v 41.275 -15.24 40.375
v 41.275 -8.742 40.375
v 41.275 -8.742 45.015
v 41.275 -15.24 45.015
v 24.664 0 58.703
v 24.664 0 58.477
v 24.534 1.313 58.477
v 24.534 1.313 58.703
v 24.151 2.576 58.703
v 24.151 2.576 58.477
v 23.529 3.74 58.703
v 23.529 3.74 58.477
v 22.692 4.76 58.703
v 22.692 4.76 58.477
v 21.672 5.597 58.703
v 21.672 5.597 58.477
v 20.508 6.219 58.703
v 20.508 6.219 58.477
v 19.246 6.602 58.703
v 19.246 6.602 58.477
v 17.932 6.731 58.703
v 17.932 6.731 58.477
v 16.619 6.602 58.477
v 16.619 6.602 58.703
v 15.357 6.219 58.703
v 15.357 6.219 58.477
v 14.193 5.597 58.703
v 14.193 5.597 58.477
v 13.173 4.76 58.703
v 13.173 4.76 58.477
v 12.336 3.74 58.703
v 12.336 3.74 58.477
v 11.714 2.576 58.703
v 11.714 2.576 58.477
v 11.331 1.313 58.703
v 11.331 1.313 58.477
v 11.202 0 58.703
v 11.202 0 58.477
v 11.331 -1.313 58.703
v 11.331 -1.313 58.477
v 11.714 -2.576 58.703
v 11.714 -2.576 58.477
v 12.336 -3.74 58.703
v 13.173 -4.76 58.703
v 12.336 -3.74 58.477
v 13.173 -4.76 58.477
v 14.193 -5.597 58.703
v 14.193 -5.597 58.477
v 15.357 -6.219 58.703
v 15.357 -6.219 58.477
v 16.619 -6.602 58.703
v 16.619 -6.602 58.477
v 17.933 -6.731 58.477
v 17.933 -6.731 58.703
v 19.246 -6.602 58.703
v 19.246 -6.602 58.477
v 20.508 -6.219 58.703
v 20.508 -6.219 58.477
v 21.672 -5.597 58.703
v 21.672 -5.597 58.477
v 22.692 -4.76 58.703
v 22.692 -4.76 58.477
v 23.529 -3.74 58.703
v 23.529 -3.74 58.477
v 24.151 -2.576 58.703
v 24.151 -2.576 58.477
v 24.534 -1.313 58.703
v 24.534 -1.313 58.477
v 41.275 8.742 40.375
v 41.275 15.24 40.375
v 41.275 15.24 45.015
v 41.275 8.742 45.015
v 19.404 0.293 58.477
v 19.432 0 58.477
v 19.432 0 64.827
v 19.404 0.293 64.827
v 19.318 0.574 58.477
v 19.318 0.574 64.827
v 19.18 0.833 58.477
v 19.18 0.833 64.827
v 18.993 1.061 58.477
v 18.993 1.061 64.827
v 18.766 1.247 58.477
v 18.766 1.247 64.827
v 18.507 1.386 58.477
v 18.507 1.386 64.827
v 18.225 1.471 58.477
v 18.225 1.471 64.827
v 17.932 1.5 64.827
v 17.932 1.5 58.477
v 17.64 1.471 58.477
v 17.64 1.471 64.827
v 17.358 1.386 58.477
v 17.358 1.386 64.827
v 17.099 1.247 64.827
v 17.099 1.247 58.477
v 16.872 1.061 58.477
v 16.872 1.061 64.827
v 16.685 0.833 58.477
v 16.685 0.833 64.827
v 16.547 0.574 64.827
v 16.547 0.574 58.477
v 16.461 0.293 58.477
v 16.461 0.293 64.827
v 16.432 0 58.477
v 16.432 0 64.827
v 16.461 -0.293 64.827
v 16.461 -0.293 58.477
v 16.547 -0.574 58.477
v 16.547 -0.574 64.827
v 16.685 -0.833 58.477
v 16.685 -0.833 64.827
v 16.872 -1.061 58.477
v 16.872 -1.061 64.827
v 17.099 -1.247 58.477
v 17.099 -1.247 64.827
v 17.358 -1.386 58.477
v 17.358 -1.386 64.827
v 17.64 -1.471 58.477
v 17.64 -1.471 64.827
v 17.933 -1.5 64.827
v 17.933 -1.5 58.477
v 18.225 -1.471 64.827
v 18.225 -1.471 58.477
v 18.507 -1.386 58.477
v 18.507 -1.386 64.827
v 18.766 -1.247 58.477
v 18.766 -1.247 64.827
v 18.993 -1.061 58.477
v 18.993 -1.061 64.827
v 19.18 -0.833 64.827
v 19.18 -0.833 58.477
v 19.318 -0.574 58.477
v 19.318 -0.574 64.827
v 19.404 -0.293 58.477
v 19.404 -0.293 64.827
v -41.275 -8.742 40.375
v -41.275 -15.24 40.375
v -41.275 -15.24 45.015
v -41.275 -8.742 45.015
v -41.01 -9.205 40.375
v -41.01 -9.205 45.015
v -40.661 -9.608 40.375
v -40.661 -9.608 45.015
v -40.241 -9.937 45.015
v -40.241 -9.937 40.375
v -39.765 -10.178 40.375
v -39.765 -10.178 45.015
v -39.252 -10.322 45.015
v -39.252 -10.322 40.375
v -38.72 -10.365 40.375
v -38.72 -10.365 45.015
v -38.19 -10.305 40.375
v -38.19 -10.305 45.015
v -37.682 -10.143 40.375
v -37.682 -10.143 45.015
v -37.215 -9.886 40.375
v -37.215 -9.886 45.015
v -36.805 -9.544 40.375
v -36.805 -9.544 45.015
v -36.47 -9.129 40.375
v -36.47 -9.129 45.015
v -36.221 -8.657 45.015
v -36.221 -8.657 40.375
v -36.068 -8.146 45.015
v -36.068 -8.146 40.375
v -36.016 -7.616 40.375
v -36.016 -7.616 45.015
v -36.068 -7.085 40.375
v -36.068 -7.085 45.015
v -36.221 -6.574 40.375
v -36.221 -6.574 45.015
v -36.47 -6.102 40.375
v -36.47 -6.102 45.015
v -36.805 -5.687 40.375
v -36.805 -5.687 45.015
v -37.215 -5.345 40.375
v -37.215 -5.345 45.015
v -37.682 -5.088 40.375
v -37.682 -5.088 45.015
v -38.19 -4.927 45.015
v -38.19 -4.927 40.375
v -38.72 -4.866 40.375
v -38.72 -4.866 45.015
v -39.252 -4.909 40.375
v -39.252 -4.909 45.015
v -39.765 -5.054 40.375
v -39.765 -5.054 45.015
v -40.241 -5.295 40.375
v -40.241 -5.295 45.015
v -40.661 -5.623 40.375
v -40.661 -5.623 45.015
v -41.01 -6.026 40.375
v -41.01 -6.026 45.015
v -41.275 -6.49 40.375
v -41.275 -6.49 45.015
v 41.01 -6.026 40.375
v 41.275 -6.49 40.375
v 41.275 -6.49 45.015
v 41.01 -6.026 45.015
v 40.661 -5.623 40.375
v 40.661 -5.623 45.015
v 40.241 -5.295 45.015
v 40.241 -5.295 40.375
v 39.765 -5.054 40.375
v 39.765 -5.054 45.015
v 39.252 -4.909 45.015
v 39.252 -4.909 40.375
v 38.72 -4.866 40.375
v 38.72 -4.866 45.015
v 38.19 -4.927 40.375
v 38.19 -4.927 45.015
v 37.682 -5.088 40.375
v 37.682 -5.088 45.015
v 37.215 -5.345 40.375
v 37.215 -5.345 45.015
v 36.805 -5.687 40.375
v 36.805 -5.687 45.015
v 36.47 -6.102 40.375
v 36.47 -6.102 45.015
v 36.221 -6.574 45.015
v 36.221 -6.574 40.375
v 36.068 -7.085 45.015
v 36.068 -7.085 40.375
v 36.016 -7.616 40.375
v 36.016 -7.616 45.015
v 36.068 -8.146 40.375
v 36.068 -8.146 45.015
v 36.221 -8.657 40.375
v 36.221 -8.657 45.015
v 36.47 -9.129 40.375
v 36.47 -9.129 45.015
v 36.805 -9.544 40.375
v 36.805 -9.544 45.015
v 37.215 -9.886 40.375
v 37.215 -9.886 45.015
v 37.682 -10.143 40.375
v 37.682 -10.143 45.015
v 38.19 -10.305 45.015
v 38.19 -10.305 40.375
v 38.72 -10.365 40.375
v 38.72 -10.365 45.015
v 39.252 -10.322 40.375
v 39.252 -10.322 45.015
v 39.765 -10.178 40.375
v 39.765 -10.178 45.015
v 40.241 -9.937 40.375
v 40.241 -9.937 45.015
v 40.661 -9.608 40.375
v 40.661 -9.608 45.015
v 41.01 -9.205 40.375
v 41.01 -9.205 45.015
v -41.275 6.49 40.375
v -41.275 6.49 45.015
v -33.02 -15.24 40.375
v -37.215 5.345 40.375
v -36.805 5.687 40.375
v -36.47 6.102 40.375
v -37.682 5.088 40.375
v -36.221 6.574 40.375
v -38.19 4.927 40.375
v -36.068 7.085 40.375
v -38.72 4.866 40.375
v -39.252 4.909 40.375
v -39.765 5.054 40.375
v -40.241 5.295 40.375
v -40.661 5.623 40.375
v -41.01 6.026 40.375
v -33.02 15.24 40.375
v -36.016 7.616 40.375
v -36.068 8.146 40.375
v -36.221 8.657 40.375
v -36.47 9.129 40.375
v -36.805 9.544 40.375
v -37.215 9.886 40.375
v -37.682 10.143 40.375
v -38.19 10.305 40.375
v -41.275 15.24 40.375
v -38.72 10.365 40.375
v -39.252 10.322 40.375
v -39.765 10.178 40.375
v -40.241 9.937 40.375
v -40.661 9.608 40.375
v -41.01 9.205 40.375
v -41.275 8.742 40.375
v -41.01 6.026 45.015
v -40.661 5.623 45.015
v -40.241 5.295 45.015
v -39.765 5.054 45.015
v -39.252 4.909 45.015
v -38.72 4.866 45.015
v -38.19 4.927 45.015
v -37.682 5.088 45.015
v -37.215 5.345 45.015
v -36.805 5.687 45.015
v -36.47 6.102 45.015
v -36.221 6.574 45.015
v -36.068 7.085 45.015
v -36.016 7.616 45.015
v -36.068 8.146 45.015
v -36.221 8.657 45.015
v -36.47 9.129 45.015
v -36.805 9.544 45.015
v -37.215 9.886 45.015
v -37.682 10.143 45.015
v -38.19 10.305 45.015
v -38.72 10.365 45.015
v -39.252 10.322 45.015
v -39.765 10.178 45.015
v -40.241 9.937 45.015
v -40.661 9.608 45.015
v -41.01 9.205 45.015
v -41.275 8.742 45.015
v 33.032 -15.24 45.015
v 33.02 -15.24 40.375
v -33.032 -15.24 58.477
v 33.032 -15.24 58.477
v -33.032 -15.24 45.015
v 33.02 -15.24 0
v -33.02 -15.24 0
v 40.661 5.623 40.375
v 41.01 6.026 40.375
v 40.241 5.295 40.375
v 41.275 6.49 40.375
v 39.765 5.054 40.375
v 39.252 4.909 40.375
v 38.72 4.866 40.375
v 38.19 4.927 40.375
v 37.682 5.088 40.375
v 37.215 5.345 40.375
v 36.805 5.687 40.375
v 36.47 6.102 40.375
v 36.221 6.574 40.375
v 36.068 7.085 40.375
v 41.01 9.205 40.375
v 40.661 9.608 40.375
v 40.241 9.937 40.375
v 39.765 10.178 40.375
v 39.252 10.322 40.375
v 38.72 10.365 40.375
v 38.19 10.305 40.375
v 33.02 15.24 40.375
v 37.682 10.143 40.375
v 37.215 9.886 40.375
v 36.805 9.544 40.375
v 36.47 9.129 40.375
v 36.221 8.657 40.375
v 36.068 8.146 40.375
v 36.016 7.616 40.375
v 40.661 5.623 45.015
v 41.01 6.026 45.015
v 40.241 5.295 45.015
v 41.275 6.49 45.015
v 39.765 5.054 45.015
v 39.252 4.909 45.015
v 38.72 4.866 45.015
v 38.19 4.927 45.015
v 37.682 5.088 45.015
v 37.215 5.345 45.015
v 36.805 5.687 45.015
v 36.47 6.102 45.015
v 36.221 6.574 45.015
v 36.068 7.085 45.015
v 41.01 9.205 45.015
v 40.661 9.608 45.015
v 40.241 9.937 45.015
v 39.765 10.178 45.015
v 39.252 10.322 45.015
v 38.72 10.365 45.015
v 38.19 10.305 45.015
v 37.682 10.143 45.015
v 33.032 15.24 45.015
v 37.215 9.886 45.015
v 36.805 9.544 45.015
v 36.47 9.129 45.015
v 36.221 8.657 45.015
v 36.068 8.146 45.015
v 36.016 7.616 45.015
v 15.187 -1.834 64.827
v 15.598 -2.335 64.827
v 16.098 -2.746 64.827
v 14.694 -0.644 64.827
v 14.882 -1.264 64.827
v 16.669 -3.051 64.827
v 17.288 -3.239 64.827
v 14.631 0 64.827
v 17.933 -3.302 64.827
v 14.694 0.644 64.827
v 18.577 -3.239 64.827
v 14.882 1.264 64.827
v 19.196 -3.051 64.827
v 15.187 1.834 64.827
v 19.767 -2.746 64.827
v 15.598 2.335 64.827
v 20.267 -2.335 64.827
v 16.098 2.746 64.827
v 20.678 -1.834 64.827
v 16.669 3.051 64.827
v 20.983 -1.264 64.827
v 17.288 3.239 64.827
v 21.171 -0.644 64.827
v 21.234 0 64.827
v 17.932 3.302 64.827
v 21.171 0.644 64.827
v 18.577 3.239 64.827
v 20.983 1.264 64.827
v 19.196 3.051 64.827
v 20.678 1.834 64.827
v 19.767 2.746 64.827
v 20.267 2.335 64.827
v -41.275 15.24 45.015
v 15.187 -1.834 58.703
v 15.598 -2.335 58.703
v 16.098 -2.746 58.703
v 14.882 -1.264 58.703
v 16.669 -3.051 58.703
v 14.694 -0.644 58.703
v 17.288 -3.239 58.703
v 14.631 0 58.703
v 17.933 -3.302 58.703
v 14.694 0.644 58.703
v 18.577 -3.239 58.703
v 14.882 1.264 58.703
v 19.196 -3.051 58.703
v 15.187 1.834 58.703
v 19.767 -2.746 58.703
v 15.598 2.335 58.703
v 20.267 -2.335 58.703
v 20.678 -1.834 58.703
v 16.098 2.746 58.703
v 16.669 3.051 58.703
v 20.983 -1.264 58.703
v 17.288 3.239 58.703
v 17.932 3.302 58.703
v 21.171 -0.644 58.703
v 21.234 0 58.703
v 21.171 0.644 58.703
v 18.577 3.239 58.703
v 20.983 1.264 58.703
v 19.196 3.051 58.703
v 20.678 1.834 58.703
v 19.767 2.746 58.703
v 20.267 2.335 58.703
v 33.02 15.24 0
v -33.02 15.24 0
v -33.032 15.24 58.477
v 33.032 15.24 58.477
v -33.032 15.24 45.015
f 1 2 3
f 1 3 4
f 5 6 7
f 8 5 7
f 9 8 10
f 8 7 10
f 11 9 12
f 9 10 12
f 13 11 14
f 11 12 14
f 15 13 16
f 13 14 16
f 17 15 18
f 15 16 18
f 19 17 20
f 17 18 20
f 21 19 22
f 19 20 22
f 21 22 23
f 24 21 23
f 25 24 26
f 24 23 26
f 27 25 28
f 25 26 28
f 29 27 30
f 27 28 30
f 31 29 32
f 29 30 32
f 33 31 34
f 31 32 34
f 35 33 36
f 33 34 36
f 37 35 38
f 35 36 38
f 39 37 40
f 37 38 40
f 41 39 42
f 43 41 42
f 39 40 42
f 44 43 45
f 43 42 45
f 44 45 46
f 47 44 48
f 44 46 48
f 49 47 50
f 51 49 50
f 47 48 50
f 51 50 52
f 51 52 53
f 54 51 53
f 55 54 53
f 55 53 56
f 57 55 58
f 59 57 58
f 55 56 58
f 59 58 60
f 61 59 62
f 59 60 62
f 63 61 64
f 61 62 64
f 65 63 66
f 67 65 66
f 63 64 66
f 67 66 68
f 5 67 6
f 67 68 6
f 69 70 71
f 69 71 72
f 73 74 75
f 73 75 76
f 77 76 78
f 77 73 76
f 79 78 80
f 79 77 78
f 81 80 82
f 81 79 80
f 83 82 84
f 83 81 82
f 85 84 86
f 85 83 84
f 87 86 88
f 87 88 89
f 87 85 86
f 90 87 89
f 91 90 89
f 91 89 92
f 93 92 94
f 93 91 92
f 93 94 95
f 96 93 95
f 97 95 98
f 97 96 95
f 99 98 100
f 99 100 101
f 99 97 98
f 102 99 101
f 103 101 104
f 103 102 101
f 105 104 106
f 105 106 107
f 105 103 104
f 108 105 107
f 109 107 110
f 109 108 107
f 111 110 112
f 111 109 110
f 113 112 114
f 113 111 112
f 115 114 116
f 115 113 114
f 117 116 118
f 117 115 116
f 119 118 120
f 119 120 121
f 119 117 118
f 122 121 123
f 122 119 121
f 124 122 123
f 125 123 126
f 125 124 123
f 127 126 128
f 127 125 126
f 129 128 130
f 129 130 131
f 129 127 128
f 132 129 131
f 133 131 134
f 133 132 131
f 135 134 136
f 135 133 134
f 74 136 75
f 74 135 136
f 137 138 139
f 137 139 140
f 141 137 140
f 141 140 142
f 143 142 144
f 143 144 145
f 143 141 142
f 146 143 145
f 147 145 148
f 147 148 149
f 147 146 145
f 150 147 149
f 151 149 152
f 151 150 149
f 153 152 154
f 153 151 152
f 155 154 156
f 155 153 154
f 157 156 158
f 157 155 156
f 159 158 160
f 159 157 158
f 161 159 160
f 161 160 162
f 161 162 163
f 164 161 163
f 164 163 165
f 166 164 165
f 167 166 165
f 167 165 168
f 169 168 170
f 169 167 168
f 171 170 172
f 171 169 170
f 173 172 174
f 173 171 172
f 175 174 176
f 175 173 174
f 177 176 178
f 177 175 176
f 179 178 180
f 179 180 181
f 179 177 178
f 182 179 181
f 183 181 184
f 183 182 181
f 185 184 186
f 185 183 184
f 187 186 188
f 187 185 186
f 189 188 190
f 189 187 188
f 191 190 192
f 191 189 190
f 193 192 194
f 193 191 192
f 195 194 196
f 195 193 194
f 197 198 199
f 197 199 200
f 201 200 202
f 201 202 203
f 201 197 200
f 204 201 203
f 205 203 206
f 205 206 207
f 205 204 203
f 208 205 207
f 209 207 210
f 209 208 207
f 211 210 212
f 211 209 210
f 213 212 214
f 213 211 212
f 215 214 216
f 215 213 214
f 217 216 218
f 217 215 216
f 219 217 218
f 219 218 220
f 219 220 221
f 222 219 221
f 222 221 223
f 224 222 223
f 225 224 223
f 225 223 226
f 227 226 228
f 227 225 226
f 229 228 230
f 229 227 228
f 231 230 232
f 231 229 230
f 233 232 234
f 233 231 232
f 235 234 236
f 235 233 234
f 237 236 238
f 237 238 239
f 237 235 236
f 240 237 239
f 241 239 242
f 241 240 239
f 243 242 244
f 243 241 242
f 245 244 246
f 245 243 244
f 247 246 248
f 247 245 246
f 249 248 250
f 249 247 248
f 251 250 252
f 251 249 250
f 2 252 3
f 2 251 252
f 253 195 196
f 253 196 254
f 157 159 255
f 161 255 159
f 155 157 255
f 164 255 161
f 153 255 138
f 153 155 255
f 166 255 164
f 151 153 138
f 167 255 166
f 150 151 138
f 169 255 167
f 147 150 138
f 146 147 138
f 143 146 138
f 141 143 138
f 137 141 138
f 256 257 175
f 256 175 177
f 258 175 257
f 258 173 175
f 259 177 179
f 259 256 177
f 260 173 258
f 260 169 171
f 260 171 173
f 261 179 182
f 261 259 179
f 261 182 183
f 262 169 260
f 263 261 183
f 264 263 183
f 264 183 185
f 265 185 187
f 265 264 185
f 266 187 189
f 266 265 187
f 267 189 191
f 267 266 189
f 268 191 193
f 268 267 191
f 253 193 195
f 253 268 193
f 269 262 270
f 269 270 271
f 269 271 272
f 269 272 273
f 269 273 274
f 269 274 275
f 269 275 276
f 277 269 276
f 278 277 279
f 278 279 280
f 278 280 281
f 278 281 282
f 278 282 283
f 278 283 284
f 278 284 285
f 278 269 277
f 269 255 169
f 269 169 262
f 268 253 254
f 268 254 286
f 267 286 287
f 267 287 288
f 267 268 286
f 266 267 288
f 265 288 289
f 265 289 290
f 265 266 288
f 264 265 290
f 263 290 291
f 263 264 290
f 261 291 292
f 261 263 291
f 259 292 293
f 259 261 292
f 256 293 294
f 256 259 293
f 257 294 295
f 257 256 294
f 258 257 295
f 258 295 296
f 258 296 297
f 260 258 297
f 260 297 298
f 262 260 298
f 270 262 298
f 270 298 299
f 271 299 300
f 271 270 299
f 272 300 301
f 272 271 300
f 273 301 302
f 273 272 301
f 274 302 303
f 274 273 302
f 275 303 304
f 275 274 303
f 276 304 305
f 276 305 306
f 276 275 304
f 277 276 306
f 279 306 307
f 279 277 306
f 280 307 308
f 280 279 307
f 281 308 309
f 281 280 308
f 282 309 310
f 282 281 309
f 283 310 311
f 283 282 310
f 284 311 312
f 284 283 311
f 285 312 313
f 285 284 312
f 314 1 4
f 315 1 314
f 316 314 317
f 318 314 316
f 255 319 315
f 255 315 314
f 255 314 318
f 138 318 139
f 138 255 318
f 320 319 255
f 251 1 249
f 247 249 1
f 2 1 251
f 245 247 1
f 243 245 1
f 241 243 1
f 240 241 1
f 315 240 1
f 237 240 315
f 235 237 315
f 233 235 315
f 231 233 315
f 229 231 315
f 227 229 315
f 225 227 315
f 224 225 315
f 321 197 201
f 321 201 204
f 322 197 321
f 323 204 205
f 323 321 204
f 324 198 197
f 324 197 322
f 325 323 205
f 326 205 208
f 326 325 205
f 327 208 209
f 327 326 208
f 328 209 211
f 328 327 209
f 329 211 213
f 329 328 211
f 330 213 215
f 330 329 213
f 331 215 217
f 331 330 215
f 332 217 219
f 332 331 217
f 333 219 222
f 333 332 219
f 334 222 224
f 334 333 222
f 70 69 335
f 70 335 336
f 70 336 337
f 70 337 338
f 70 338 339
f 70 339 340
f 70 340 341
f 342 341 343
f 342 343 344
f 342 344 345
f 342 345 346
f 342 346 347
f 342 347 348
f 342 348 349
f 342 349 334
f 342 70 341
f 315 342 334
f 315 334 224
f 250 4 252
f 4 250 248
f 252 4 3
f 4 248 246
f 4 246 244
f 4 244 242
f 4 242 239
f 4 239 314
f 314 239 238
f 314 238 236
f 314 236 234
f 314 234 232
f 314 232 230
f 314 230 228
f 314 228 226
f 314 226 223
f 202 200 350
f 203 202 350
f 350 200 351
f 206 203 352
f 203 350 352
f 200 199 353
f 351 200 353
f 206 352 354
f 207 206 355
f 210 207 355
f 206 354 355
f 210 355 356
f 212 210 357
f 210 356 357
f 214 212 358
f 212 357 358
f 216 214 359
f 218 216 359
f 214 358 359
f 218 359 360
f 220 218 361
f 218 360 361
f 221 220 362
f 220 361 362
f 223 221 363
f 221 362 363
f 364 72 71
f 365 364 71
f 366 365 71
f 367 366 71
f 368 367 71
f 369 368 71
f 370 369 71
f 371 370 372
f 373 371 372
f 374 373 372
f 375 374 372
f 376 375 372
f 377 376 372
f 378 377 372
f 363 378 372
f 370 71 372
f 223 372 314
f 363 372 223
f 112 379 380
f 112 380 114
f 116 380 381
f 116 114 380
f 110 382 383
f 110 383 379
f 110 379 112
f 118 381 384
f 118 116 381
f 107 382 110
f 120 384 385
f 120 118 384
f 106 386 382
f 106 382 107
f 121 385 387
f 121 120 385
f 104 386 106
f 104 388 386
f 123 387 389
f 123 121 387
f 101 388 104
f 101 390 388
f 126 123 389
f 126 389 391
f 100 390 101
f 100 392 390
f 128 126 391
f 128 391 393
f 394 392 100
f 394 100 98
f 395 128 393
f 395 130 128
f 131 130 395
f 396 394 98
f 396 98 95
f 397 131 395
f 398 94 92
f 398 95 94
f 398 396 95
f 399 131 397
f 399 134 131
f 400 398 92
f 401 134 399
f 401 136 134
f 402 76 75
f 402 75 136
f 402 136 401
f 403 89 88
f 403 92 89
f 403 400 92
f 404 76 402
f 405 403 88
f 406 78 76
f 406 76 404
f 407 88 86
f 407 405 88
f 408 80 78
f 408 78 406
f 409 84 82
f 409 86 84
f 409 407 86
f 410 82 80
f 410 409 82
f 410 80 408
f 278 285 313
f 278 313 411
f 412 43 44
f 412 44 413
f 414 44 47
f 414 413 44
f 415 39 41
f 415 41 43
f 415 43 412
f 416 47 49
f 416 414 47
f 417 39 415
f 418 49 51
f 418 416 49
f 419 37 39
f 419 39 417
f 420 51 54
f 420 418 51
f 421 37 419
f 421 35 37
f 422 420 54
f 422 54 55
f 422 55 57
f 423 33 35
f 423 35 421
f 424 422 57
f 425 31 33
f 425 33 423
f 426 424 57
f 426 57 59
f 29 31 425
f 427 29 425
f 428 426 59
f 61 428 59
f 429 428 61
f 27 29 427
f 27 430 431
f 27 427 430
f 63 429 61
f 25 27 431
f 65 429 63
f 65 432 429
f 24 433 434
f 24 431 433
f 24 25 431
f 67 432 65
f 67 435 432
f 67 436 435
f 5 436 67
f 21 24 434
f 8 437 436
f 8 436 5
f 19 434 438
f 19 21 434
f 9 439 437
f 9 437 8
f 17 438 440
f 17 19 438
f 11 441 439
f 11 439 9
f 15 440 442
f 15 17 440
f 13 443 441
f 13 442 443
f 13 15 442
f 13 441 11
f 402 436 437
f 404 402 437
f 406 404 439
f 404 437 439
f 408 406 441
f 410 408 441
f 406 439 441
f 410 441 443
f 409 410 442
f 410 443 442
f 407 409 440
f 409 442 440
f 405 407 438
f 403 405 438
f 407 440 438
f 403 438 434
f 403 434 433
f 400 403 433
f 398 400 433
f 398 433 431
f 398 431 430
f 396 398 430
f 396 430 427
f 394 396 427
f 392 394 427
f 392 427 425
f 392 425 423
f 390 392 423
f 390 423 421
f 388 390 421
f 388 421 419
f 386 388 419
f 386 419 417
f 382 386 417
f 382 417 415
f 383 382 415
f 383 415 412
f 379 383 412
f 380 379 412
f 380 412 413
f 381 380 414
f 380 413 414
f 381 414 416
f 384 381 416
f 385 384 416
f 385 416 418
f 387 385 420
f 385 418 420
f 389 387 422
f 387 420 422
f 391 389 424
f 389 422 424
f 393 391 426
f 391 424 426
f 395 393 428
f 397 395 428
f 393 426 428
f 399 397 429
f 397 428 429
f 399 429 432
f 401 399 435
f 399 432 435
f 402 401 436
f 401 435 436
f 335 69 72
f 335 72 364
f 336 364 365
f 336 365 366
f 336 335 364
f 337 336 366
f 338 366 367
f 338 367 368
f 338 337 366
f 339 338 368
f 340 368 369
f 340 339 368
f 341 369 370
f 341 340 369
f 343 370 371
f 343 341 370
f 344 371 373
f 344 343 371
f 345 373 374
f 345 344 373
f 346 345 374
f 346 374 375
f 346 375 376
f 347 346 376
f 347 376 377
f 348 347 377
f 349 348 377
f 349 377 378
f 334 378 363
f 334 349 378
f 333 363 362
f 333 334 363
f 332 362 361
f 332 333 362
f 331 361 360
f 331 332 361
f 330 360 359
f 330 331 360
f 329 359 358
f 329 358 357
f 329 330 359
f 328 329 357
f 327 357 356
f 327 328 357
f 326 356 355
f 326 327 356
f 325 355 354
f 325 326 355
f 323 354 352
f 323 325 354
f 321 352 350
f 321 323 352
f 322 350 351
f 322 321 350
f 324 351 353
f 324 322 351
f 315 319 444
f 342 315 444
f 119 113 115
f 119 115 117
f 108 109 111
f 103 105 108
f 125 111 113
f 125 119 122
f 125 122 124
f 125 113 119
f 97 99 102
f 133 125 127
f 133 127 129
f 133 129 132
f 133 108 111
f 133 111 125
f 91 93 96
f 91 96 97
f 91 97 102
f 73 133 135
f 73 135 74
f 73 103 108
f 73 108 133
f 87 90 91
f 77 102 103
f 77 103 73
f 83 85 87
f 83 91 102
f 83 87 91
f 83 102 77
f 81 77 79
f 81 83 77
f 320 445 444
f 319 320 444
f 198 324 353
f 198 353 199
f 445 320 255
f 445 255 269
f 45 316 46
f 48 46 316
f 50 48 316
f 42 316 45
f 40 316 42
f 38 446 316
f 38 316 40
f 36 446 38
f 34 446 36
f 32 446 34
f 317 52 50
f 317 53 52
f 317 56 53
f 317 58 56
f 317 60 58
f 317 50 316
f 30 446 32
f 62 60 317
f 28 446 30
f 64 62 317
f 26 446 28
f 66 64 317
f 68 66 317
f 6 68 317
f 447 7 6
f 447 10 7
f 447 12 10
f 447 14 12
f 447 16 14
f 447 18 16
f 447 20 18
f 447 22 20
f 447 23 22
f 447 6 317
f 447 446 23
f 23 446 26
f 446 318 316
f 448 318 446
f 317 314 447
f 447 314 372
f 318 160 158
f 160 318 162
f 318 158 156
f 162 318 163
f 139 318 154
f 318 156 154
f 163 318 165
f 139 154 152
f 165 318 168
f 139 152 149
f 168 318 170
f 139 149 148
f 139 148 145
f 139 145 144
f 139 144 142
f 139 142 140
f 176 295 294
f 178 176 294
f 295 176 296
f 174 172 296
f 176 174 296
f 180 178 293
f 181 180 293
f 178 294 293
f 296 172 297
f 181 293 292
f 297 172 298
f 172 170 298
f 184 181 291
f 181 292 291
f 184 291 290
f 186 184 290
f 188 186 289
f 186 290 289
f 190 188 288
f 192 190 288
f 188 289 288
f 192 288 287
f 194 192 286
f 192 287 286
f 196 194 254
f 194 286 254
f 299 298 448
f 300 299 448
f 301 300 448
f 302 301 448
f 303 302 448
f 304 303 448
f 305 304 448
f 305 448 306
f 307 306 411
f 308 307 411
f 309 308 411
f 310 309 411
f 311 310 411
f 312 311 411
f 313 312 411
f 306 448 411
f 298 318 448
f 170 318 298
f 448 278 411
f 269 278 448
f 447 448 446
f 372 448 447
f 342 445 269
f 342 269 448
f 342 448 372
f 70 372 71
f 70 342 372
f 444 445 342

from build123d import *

# Parameters (mm, degrees)
SKETCH_1_W       = 66.04
SKETCH_1_H       = 30.48
EXTRUDE_1_DEPTH  = 40.3754
EXTRUDE_11_DEPTH = 4.64
SKETCH_3_W       = 66.06472
SKETCH_3_H       = 30.48
EXTRUDE_12_DEPTH = 13.462
SKETCH_5_R       = 6.731
SKETCH_5_R_2     = 3.302
EXTRUDE_13_DEPTH = 0.22537
SKETCH_6_R       = 3.302
SKETCH_6_R_2     = 1.5
EXTRUDE_14_DEPTH = 6.35


with BuildPart() as part:
    # 스케치1 → 보스-돌출1 (new body)
    with BuildSketch(Plane.XY):
        Rectangle(SKETCH_1_W, SKETCH_1_H)
    extrude(amount=EXTRUDE_1_DEPTH)

    # 스케치2 → 보스-돌출11 (add)
    with BuildSketch(Plane.XY.offset(40.3754)):
        with BuildLine():
            Line((41.275, -8.74168445), (41.275, -15.24))
            Line((41.275, -15.24), (-41.275, -15.24))
            Line((-41.275, -15.24), (-41.275, -8.74168445))
            ThreePointArc((-41.275, -8.74168445), (-36.01612, -7.61562), (-41.275, -6.48955555))
            Line((-41.275, -6.48955555), (-41.275, 6.48955555))
            ThreePointArc((-41.275, 6.48955555), (-36.01612, 7.61562), (-41.275, 8.74168445))
            Line((-41.275, 8.74168445), (-41.275, 15.24))
            Line((-41.275, 15.24), (41.275, 15.24))
            Line((41.275, 15.24), (41.275, 8.74168445))
            ThreePointArc((41.275, 8.74168445), (36.01612, 7.61562), (41.275, 6.48955555))
            Line((41.275, 6.48955555), (41.275, -6.48955555))
            ThreePointArc((41.275, -6.48955555), (36.01612, -7.61562), (41.275, -8.74168445))
        make_face()
    extrude(amount=EXTRUDE_11_DEPTH)

    # 스케치3 → 보스-돌출12 (add)
    with BuildSketch(Plane.XY.offset(45.0154)):
        Rectangle(SKETCH_3_W, SKETCH_3_H)
    extrude(amount=EXTRUDE_12_DEPTH)

    # 스케치5 → 보스-돌출13 (add)
    with BuildSketch(Plane.XY.offset(58.4774)):
        with Locations((17.9325, 0)):
            Circle(SKETCH_5_R)
        with Locations((17.9325, 0)):
            Circle(SKETCH_5_R_2, mode=Mode.SUBTRACT)
    extrude(amount=EXTRUDE_13_DEPTH)

    # 스케치6 → 보스-돌출14 (add)
    with BuildSketch(Plane.XY.offset(58.4774)):
        with Locations((17.9325, 0)):
            Circle(SKETCH_6_R)
        with Locations((17.9325, 0)):
            Circle(SKETCH_6_R_2, mode=Mode.SUBTRACT)
    extrude(amount=EXTRUDE_14_DEPTH)


solid = part.part
